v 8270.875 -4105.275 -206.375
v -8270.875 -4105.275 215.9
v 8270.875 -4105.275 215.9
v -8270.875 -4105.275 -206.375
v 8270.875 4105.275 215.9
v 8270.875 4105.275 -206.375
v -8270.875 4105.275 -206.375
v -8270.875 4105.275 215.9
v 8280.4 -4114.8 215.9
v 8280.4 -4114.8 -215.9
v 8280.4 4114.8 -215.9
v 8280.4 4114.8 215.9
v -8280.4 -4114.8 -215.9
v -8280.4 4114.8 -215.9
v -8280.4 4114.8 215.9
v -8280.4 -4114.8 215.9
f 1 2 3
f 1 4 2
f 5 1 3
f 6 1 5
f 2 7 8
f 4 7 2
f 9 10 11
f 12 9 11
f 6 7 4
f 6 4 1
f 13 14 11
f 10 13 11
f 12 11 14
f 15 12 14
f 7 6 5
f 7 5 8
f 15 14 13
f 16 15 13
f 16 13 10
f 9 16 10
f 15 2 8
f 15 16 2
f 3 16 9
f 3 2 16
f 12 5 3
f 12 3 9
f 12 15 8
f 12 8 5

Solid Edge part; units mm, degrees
sketch "Sketch1" plane through (0, 0, 0) normal (0, 0, 1) x (1, 0, 0)
  line L0 (-8280.4, 4114.8) -> (-8280.4, -4114.8)
  line L1 (-8280.4, -4114.8) -> (8280.4, -4114.8)
  line L2 (8280.4, -4114.8) -> (8280.4, 4114.8)
  line L3 (8280.4, 4114.8) -> (-8280.4, 4114.8)
extrude "Protrusion1" add sketch "Sketch1" along normal mid plane 431.8
shell "Thinwall_1" thickness 9.525 removed faces 1 at (-5685.8747, -2660.904, 215.9)
